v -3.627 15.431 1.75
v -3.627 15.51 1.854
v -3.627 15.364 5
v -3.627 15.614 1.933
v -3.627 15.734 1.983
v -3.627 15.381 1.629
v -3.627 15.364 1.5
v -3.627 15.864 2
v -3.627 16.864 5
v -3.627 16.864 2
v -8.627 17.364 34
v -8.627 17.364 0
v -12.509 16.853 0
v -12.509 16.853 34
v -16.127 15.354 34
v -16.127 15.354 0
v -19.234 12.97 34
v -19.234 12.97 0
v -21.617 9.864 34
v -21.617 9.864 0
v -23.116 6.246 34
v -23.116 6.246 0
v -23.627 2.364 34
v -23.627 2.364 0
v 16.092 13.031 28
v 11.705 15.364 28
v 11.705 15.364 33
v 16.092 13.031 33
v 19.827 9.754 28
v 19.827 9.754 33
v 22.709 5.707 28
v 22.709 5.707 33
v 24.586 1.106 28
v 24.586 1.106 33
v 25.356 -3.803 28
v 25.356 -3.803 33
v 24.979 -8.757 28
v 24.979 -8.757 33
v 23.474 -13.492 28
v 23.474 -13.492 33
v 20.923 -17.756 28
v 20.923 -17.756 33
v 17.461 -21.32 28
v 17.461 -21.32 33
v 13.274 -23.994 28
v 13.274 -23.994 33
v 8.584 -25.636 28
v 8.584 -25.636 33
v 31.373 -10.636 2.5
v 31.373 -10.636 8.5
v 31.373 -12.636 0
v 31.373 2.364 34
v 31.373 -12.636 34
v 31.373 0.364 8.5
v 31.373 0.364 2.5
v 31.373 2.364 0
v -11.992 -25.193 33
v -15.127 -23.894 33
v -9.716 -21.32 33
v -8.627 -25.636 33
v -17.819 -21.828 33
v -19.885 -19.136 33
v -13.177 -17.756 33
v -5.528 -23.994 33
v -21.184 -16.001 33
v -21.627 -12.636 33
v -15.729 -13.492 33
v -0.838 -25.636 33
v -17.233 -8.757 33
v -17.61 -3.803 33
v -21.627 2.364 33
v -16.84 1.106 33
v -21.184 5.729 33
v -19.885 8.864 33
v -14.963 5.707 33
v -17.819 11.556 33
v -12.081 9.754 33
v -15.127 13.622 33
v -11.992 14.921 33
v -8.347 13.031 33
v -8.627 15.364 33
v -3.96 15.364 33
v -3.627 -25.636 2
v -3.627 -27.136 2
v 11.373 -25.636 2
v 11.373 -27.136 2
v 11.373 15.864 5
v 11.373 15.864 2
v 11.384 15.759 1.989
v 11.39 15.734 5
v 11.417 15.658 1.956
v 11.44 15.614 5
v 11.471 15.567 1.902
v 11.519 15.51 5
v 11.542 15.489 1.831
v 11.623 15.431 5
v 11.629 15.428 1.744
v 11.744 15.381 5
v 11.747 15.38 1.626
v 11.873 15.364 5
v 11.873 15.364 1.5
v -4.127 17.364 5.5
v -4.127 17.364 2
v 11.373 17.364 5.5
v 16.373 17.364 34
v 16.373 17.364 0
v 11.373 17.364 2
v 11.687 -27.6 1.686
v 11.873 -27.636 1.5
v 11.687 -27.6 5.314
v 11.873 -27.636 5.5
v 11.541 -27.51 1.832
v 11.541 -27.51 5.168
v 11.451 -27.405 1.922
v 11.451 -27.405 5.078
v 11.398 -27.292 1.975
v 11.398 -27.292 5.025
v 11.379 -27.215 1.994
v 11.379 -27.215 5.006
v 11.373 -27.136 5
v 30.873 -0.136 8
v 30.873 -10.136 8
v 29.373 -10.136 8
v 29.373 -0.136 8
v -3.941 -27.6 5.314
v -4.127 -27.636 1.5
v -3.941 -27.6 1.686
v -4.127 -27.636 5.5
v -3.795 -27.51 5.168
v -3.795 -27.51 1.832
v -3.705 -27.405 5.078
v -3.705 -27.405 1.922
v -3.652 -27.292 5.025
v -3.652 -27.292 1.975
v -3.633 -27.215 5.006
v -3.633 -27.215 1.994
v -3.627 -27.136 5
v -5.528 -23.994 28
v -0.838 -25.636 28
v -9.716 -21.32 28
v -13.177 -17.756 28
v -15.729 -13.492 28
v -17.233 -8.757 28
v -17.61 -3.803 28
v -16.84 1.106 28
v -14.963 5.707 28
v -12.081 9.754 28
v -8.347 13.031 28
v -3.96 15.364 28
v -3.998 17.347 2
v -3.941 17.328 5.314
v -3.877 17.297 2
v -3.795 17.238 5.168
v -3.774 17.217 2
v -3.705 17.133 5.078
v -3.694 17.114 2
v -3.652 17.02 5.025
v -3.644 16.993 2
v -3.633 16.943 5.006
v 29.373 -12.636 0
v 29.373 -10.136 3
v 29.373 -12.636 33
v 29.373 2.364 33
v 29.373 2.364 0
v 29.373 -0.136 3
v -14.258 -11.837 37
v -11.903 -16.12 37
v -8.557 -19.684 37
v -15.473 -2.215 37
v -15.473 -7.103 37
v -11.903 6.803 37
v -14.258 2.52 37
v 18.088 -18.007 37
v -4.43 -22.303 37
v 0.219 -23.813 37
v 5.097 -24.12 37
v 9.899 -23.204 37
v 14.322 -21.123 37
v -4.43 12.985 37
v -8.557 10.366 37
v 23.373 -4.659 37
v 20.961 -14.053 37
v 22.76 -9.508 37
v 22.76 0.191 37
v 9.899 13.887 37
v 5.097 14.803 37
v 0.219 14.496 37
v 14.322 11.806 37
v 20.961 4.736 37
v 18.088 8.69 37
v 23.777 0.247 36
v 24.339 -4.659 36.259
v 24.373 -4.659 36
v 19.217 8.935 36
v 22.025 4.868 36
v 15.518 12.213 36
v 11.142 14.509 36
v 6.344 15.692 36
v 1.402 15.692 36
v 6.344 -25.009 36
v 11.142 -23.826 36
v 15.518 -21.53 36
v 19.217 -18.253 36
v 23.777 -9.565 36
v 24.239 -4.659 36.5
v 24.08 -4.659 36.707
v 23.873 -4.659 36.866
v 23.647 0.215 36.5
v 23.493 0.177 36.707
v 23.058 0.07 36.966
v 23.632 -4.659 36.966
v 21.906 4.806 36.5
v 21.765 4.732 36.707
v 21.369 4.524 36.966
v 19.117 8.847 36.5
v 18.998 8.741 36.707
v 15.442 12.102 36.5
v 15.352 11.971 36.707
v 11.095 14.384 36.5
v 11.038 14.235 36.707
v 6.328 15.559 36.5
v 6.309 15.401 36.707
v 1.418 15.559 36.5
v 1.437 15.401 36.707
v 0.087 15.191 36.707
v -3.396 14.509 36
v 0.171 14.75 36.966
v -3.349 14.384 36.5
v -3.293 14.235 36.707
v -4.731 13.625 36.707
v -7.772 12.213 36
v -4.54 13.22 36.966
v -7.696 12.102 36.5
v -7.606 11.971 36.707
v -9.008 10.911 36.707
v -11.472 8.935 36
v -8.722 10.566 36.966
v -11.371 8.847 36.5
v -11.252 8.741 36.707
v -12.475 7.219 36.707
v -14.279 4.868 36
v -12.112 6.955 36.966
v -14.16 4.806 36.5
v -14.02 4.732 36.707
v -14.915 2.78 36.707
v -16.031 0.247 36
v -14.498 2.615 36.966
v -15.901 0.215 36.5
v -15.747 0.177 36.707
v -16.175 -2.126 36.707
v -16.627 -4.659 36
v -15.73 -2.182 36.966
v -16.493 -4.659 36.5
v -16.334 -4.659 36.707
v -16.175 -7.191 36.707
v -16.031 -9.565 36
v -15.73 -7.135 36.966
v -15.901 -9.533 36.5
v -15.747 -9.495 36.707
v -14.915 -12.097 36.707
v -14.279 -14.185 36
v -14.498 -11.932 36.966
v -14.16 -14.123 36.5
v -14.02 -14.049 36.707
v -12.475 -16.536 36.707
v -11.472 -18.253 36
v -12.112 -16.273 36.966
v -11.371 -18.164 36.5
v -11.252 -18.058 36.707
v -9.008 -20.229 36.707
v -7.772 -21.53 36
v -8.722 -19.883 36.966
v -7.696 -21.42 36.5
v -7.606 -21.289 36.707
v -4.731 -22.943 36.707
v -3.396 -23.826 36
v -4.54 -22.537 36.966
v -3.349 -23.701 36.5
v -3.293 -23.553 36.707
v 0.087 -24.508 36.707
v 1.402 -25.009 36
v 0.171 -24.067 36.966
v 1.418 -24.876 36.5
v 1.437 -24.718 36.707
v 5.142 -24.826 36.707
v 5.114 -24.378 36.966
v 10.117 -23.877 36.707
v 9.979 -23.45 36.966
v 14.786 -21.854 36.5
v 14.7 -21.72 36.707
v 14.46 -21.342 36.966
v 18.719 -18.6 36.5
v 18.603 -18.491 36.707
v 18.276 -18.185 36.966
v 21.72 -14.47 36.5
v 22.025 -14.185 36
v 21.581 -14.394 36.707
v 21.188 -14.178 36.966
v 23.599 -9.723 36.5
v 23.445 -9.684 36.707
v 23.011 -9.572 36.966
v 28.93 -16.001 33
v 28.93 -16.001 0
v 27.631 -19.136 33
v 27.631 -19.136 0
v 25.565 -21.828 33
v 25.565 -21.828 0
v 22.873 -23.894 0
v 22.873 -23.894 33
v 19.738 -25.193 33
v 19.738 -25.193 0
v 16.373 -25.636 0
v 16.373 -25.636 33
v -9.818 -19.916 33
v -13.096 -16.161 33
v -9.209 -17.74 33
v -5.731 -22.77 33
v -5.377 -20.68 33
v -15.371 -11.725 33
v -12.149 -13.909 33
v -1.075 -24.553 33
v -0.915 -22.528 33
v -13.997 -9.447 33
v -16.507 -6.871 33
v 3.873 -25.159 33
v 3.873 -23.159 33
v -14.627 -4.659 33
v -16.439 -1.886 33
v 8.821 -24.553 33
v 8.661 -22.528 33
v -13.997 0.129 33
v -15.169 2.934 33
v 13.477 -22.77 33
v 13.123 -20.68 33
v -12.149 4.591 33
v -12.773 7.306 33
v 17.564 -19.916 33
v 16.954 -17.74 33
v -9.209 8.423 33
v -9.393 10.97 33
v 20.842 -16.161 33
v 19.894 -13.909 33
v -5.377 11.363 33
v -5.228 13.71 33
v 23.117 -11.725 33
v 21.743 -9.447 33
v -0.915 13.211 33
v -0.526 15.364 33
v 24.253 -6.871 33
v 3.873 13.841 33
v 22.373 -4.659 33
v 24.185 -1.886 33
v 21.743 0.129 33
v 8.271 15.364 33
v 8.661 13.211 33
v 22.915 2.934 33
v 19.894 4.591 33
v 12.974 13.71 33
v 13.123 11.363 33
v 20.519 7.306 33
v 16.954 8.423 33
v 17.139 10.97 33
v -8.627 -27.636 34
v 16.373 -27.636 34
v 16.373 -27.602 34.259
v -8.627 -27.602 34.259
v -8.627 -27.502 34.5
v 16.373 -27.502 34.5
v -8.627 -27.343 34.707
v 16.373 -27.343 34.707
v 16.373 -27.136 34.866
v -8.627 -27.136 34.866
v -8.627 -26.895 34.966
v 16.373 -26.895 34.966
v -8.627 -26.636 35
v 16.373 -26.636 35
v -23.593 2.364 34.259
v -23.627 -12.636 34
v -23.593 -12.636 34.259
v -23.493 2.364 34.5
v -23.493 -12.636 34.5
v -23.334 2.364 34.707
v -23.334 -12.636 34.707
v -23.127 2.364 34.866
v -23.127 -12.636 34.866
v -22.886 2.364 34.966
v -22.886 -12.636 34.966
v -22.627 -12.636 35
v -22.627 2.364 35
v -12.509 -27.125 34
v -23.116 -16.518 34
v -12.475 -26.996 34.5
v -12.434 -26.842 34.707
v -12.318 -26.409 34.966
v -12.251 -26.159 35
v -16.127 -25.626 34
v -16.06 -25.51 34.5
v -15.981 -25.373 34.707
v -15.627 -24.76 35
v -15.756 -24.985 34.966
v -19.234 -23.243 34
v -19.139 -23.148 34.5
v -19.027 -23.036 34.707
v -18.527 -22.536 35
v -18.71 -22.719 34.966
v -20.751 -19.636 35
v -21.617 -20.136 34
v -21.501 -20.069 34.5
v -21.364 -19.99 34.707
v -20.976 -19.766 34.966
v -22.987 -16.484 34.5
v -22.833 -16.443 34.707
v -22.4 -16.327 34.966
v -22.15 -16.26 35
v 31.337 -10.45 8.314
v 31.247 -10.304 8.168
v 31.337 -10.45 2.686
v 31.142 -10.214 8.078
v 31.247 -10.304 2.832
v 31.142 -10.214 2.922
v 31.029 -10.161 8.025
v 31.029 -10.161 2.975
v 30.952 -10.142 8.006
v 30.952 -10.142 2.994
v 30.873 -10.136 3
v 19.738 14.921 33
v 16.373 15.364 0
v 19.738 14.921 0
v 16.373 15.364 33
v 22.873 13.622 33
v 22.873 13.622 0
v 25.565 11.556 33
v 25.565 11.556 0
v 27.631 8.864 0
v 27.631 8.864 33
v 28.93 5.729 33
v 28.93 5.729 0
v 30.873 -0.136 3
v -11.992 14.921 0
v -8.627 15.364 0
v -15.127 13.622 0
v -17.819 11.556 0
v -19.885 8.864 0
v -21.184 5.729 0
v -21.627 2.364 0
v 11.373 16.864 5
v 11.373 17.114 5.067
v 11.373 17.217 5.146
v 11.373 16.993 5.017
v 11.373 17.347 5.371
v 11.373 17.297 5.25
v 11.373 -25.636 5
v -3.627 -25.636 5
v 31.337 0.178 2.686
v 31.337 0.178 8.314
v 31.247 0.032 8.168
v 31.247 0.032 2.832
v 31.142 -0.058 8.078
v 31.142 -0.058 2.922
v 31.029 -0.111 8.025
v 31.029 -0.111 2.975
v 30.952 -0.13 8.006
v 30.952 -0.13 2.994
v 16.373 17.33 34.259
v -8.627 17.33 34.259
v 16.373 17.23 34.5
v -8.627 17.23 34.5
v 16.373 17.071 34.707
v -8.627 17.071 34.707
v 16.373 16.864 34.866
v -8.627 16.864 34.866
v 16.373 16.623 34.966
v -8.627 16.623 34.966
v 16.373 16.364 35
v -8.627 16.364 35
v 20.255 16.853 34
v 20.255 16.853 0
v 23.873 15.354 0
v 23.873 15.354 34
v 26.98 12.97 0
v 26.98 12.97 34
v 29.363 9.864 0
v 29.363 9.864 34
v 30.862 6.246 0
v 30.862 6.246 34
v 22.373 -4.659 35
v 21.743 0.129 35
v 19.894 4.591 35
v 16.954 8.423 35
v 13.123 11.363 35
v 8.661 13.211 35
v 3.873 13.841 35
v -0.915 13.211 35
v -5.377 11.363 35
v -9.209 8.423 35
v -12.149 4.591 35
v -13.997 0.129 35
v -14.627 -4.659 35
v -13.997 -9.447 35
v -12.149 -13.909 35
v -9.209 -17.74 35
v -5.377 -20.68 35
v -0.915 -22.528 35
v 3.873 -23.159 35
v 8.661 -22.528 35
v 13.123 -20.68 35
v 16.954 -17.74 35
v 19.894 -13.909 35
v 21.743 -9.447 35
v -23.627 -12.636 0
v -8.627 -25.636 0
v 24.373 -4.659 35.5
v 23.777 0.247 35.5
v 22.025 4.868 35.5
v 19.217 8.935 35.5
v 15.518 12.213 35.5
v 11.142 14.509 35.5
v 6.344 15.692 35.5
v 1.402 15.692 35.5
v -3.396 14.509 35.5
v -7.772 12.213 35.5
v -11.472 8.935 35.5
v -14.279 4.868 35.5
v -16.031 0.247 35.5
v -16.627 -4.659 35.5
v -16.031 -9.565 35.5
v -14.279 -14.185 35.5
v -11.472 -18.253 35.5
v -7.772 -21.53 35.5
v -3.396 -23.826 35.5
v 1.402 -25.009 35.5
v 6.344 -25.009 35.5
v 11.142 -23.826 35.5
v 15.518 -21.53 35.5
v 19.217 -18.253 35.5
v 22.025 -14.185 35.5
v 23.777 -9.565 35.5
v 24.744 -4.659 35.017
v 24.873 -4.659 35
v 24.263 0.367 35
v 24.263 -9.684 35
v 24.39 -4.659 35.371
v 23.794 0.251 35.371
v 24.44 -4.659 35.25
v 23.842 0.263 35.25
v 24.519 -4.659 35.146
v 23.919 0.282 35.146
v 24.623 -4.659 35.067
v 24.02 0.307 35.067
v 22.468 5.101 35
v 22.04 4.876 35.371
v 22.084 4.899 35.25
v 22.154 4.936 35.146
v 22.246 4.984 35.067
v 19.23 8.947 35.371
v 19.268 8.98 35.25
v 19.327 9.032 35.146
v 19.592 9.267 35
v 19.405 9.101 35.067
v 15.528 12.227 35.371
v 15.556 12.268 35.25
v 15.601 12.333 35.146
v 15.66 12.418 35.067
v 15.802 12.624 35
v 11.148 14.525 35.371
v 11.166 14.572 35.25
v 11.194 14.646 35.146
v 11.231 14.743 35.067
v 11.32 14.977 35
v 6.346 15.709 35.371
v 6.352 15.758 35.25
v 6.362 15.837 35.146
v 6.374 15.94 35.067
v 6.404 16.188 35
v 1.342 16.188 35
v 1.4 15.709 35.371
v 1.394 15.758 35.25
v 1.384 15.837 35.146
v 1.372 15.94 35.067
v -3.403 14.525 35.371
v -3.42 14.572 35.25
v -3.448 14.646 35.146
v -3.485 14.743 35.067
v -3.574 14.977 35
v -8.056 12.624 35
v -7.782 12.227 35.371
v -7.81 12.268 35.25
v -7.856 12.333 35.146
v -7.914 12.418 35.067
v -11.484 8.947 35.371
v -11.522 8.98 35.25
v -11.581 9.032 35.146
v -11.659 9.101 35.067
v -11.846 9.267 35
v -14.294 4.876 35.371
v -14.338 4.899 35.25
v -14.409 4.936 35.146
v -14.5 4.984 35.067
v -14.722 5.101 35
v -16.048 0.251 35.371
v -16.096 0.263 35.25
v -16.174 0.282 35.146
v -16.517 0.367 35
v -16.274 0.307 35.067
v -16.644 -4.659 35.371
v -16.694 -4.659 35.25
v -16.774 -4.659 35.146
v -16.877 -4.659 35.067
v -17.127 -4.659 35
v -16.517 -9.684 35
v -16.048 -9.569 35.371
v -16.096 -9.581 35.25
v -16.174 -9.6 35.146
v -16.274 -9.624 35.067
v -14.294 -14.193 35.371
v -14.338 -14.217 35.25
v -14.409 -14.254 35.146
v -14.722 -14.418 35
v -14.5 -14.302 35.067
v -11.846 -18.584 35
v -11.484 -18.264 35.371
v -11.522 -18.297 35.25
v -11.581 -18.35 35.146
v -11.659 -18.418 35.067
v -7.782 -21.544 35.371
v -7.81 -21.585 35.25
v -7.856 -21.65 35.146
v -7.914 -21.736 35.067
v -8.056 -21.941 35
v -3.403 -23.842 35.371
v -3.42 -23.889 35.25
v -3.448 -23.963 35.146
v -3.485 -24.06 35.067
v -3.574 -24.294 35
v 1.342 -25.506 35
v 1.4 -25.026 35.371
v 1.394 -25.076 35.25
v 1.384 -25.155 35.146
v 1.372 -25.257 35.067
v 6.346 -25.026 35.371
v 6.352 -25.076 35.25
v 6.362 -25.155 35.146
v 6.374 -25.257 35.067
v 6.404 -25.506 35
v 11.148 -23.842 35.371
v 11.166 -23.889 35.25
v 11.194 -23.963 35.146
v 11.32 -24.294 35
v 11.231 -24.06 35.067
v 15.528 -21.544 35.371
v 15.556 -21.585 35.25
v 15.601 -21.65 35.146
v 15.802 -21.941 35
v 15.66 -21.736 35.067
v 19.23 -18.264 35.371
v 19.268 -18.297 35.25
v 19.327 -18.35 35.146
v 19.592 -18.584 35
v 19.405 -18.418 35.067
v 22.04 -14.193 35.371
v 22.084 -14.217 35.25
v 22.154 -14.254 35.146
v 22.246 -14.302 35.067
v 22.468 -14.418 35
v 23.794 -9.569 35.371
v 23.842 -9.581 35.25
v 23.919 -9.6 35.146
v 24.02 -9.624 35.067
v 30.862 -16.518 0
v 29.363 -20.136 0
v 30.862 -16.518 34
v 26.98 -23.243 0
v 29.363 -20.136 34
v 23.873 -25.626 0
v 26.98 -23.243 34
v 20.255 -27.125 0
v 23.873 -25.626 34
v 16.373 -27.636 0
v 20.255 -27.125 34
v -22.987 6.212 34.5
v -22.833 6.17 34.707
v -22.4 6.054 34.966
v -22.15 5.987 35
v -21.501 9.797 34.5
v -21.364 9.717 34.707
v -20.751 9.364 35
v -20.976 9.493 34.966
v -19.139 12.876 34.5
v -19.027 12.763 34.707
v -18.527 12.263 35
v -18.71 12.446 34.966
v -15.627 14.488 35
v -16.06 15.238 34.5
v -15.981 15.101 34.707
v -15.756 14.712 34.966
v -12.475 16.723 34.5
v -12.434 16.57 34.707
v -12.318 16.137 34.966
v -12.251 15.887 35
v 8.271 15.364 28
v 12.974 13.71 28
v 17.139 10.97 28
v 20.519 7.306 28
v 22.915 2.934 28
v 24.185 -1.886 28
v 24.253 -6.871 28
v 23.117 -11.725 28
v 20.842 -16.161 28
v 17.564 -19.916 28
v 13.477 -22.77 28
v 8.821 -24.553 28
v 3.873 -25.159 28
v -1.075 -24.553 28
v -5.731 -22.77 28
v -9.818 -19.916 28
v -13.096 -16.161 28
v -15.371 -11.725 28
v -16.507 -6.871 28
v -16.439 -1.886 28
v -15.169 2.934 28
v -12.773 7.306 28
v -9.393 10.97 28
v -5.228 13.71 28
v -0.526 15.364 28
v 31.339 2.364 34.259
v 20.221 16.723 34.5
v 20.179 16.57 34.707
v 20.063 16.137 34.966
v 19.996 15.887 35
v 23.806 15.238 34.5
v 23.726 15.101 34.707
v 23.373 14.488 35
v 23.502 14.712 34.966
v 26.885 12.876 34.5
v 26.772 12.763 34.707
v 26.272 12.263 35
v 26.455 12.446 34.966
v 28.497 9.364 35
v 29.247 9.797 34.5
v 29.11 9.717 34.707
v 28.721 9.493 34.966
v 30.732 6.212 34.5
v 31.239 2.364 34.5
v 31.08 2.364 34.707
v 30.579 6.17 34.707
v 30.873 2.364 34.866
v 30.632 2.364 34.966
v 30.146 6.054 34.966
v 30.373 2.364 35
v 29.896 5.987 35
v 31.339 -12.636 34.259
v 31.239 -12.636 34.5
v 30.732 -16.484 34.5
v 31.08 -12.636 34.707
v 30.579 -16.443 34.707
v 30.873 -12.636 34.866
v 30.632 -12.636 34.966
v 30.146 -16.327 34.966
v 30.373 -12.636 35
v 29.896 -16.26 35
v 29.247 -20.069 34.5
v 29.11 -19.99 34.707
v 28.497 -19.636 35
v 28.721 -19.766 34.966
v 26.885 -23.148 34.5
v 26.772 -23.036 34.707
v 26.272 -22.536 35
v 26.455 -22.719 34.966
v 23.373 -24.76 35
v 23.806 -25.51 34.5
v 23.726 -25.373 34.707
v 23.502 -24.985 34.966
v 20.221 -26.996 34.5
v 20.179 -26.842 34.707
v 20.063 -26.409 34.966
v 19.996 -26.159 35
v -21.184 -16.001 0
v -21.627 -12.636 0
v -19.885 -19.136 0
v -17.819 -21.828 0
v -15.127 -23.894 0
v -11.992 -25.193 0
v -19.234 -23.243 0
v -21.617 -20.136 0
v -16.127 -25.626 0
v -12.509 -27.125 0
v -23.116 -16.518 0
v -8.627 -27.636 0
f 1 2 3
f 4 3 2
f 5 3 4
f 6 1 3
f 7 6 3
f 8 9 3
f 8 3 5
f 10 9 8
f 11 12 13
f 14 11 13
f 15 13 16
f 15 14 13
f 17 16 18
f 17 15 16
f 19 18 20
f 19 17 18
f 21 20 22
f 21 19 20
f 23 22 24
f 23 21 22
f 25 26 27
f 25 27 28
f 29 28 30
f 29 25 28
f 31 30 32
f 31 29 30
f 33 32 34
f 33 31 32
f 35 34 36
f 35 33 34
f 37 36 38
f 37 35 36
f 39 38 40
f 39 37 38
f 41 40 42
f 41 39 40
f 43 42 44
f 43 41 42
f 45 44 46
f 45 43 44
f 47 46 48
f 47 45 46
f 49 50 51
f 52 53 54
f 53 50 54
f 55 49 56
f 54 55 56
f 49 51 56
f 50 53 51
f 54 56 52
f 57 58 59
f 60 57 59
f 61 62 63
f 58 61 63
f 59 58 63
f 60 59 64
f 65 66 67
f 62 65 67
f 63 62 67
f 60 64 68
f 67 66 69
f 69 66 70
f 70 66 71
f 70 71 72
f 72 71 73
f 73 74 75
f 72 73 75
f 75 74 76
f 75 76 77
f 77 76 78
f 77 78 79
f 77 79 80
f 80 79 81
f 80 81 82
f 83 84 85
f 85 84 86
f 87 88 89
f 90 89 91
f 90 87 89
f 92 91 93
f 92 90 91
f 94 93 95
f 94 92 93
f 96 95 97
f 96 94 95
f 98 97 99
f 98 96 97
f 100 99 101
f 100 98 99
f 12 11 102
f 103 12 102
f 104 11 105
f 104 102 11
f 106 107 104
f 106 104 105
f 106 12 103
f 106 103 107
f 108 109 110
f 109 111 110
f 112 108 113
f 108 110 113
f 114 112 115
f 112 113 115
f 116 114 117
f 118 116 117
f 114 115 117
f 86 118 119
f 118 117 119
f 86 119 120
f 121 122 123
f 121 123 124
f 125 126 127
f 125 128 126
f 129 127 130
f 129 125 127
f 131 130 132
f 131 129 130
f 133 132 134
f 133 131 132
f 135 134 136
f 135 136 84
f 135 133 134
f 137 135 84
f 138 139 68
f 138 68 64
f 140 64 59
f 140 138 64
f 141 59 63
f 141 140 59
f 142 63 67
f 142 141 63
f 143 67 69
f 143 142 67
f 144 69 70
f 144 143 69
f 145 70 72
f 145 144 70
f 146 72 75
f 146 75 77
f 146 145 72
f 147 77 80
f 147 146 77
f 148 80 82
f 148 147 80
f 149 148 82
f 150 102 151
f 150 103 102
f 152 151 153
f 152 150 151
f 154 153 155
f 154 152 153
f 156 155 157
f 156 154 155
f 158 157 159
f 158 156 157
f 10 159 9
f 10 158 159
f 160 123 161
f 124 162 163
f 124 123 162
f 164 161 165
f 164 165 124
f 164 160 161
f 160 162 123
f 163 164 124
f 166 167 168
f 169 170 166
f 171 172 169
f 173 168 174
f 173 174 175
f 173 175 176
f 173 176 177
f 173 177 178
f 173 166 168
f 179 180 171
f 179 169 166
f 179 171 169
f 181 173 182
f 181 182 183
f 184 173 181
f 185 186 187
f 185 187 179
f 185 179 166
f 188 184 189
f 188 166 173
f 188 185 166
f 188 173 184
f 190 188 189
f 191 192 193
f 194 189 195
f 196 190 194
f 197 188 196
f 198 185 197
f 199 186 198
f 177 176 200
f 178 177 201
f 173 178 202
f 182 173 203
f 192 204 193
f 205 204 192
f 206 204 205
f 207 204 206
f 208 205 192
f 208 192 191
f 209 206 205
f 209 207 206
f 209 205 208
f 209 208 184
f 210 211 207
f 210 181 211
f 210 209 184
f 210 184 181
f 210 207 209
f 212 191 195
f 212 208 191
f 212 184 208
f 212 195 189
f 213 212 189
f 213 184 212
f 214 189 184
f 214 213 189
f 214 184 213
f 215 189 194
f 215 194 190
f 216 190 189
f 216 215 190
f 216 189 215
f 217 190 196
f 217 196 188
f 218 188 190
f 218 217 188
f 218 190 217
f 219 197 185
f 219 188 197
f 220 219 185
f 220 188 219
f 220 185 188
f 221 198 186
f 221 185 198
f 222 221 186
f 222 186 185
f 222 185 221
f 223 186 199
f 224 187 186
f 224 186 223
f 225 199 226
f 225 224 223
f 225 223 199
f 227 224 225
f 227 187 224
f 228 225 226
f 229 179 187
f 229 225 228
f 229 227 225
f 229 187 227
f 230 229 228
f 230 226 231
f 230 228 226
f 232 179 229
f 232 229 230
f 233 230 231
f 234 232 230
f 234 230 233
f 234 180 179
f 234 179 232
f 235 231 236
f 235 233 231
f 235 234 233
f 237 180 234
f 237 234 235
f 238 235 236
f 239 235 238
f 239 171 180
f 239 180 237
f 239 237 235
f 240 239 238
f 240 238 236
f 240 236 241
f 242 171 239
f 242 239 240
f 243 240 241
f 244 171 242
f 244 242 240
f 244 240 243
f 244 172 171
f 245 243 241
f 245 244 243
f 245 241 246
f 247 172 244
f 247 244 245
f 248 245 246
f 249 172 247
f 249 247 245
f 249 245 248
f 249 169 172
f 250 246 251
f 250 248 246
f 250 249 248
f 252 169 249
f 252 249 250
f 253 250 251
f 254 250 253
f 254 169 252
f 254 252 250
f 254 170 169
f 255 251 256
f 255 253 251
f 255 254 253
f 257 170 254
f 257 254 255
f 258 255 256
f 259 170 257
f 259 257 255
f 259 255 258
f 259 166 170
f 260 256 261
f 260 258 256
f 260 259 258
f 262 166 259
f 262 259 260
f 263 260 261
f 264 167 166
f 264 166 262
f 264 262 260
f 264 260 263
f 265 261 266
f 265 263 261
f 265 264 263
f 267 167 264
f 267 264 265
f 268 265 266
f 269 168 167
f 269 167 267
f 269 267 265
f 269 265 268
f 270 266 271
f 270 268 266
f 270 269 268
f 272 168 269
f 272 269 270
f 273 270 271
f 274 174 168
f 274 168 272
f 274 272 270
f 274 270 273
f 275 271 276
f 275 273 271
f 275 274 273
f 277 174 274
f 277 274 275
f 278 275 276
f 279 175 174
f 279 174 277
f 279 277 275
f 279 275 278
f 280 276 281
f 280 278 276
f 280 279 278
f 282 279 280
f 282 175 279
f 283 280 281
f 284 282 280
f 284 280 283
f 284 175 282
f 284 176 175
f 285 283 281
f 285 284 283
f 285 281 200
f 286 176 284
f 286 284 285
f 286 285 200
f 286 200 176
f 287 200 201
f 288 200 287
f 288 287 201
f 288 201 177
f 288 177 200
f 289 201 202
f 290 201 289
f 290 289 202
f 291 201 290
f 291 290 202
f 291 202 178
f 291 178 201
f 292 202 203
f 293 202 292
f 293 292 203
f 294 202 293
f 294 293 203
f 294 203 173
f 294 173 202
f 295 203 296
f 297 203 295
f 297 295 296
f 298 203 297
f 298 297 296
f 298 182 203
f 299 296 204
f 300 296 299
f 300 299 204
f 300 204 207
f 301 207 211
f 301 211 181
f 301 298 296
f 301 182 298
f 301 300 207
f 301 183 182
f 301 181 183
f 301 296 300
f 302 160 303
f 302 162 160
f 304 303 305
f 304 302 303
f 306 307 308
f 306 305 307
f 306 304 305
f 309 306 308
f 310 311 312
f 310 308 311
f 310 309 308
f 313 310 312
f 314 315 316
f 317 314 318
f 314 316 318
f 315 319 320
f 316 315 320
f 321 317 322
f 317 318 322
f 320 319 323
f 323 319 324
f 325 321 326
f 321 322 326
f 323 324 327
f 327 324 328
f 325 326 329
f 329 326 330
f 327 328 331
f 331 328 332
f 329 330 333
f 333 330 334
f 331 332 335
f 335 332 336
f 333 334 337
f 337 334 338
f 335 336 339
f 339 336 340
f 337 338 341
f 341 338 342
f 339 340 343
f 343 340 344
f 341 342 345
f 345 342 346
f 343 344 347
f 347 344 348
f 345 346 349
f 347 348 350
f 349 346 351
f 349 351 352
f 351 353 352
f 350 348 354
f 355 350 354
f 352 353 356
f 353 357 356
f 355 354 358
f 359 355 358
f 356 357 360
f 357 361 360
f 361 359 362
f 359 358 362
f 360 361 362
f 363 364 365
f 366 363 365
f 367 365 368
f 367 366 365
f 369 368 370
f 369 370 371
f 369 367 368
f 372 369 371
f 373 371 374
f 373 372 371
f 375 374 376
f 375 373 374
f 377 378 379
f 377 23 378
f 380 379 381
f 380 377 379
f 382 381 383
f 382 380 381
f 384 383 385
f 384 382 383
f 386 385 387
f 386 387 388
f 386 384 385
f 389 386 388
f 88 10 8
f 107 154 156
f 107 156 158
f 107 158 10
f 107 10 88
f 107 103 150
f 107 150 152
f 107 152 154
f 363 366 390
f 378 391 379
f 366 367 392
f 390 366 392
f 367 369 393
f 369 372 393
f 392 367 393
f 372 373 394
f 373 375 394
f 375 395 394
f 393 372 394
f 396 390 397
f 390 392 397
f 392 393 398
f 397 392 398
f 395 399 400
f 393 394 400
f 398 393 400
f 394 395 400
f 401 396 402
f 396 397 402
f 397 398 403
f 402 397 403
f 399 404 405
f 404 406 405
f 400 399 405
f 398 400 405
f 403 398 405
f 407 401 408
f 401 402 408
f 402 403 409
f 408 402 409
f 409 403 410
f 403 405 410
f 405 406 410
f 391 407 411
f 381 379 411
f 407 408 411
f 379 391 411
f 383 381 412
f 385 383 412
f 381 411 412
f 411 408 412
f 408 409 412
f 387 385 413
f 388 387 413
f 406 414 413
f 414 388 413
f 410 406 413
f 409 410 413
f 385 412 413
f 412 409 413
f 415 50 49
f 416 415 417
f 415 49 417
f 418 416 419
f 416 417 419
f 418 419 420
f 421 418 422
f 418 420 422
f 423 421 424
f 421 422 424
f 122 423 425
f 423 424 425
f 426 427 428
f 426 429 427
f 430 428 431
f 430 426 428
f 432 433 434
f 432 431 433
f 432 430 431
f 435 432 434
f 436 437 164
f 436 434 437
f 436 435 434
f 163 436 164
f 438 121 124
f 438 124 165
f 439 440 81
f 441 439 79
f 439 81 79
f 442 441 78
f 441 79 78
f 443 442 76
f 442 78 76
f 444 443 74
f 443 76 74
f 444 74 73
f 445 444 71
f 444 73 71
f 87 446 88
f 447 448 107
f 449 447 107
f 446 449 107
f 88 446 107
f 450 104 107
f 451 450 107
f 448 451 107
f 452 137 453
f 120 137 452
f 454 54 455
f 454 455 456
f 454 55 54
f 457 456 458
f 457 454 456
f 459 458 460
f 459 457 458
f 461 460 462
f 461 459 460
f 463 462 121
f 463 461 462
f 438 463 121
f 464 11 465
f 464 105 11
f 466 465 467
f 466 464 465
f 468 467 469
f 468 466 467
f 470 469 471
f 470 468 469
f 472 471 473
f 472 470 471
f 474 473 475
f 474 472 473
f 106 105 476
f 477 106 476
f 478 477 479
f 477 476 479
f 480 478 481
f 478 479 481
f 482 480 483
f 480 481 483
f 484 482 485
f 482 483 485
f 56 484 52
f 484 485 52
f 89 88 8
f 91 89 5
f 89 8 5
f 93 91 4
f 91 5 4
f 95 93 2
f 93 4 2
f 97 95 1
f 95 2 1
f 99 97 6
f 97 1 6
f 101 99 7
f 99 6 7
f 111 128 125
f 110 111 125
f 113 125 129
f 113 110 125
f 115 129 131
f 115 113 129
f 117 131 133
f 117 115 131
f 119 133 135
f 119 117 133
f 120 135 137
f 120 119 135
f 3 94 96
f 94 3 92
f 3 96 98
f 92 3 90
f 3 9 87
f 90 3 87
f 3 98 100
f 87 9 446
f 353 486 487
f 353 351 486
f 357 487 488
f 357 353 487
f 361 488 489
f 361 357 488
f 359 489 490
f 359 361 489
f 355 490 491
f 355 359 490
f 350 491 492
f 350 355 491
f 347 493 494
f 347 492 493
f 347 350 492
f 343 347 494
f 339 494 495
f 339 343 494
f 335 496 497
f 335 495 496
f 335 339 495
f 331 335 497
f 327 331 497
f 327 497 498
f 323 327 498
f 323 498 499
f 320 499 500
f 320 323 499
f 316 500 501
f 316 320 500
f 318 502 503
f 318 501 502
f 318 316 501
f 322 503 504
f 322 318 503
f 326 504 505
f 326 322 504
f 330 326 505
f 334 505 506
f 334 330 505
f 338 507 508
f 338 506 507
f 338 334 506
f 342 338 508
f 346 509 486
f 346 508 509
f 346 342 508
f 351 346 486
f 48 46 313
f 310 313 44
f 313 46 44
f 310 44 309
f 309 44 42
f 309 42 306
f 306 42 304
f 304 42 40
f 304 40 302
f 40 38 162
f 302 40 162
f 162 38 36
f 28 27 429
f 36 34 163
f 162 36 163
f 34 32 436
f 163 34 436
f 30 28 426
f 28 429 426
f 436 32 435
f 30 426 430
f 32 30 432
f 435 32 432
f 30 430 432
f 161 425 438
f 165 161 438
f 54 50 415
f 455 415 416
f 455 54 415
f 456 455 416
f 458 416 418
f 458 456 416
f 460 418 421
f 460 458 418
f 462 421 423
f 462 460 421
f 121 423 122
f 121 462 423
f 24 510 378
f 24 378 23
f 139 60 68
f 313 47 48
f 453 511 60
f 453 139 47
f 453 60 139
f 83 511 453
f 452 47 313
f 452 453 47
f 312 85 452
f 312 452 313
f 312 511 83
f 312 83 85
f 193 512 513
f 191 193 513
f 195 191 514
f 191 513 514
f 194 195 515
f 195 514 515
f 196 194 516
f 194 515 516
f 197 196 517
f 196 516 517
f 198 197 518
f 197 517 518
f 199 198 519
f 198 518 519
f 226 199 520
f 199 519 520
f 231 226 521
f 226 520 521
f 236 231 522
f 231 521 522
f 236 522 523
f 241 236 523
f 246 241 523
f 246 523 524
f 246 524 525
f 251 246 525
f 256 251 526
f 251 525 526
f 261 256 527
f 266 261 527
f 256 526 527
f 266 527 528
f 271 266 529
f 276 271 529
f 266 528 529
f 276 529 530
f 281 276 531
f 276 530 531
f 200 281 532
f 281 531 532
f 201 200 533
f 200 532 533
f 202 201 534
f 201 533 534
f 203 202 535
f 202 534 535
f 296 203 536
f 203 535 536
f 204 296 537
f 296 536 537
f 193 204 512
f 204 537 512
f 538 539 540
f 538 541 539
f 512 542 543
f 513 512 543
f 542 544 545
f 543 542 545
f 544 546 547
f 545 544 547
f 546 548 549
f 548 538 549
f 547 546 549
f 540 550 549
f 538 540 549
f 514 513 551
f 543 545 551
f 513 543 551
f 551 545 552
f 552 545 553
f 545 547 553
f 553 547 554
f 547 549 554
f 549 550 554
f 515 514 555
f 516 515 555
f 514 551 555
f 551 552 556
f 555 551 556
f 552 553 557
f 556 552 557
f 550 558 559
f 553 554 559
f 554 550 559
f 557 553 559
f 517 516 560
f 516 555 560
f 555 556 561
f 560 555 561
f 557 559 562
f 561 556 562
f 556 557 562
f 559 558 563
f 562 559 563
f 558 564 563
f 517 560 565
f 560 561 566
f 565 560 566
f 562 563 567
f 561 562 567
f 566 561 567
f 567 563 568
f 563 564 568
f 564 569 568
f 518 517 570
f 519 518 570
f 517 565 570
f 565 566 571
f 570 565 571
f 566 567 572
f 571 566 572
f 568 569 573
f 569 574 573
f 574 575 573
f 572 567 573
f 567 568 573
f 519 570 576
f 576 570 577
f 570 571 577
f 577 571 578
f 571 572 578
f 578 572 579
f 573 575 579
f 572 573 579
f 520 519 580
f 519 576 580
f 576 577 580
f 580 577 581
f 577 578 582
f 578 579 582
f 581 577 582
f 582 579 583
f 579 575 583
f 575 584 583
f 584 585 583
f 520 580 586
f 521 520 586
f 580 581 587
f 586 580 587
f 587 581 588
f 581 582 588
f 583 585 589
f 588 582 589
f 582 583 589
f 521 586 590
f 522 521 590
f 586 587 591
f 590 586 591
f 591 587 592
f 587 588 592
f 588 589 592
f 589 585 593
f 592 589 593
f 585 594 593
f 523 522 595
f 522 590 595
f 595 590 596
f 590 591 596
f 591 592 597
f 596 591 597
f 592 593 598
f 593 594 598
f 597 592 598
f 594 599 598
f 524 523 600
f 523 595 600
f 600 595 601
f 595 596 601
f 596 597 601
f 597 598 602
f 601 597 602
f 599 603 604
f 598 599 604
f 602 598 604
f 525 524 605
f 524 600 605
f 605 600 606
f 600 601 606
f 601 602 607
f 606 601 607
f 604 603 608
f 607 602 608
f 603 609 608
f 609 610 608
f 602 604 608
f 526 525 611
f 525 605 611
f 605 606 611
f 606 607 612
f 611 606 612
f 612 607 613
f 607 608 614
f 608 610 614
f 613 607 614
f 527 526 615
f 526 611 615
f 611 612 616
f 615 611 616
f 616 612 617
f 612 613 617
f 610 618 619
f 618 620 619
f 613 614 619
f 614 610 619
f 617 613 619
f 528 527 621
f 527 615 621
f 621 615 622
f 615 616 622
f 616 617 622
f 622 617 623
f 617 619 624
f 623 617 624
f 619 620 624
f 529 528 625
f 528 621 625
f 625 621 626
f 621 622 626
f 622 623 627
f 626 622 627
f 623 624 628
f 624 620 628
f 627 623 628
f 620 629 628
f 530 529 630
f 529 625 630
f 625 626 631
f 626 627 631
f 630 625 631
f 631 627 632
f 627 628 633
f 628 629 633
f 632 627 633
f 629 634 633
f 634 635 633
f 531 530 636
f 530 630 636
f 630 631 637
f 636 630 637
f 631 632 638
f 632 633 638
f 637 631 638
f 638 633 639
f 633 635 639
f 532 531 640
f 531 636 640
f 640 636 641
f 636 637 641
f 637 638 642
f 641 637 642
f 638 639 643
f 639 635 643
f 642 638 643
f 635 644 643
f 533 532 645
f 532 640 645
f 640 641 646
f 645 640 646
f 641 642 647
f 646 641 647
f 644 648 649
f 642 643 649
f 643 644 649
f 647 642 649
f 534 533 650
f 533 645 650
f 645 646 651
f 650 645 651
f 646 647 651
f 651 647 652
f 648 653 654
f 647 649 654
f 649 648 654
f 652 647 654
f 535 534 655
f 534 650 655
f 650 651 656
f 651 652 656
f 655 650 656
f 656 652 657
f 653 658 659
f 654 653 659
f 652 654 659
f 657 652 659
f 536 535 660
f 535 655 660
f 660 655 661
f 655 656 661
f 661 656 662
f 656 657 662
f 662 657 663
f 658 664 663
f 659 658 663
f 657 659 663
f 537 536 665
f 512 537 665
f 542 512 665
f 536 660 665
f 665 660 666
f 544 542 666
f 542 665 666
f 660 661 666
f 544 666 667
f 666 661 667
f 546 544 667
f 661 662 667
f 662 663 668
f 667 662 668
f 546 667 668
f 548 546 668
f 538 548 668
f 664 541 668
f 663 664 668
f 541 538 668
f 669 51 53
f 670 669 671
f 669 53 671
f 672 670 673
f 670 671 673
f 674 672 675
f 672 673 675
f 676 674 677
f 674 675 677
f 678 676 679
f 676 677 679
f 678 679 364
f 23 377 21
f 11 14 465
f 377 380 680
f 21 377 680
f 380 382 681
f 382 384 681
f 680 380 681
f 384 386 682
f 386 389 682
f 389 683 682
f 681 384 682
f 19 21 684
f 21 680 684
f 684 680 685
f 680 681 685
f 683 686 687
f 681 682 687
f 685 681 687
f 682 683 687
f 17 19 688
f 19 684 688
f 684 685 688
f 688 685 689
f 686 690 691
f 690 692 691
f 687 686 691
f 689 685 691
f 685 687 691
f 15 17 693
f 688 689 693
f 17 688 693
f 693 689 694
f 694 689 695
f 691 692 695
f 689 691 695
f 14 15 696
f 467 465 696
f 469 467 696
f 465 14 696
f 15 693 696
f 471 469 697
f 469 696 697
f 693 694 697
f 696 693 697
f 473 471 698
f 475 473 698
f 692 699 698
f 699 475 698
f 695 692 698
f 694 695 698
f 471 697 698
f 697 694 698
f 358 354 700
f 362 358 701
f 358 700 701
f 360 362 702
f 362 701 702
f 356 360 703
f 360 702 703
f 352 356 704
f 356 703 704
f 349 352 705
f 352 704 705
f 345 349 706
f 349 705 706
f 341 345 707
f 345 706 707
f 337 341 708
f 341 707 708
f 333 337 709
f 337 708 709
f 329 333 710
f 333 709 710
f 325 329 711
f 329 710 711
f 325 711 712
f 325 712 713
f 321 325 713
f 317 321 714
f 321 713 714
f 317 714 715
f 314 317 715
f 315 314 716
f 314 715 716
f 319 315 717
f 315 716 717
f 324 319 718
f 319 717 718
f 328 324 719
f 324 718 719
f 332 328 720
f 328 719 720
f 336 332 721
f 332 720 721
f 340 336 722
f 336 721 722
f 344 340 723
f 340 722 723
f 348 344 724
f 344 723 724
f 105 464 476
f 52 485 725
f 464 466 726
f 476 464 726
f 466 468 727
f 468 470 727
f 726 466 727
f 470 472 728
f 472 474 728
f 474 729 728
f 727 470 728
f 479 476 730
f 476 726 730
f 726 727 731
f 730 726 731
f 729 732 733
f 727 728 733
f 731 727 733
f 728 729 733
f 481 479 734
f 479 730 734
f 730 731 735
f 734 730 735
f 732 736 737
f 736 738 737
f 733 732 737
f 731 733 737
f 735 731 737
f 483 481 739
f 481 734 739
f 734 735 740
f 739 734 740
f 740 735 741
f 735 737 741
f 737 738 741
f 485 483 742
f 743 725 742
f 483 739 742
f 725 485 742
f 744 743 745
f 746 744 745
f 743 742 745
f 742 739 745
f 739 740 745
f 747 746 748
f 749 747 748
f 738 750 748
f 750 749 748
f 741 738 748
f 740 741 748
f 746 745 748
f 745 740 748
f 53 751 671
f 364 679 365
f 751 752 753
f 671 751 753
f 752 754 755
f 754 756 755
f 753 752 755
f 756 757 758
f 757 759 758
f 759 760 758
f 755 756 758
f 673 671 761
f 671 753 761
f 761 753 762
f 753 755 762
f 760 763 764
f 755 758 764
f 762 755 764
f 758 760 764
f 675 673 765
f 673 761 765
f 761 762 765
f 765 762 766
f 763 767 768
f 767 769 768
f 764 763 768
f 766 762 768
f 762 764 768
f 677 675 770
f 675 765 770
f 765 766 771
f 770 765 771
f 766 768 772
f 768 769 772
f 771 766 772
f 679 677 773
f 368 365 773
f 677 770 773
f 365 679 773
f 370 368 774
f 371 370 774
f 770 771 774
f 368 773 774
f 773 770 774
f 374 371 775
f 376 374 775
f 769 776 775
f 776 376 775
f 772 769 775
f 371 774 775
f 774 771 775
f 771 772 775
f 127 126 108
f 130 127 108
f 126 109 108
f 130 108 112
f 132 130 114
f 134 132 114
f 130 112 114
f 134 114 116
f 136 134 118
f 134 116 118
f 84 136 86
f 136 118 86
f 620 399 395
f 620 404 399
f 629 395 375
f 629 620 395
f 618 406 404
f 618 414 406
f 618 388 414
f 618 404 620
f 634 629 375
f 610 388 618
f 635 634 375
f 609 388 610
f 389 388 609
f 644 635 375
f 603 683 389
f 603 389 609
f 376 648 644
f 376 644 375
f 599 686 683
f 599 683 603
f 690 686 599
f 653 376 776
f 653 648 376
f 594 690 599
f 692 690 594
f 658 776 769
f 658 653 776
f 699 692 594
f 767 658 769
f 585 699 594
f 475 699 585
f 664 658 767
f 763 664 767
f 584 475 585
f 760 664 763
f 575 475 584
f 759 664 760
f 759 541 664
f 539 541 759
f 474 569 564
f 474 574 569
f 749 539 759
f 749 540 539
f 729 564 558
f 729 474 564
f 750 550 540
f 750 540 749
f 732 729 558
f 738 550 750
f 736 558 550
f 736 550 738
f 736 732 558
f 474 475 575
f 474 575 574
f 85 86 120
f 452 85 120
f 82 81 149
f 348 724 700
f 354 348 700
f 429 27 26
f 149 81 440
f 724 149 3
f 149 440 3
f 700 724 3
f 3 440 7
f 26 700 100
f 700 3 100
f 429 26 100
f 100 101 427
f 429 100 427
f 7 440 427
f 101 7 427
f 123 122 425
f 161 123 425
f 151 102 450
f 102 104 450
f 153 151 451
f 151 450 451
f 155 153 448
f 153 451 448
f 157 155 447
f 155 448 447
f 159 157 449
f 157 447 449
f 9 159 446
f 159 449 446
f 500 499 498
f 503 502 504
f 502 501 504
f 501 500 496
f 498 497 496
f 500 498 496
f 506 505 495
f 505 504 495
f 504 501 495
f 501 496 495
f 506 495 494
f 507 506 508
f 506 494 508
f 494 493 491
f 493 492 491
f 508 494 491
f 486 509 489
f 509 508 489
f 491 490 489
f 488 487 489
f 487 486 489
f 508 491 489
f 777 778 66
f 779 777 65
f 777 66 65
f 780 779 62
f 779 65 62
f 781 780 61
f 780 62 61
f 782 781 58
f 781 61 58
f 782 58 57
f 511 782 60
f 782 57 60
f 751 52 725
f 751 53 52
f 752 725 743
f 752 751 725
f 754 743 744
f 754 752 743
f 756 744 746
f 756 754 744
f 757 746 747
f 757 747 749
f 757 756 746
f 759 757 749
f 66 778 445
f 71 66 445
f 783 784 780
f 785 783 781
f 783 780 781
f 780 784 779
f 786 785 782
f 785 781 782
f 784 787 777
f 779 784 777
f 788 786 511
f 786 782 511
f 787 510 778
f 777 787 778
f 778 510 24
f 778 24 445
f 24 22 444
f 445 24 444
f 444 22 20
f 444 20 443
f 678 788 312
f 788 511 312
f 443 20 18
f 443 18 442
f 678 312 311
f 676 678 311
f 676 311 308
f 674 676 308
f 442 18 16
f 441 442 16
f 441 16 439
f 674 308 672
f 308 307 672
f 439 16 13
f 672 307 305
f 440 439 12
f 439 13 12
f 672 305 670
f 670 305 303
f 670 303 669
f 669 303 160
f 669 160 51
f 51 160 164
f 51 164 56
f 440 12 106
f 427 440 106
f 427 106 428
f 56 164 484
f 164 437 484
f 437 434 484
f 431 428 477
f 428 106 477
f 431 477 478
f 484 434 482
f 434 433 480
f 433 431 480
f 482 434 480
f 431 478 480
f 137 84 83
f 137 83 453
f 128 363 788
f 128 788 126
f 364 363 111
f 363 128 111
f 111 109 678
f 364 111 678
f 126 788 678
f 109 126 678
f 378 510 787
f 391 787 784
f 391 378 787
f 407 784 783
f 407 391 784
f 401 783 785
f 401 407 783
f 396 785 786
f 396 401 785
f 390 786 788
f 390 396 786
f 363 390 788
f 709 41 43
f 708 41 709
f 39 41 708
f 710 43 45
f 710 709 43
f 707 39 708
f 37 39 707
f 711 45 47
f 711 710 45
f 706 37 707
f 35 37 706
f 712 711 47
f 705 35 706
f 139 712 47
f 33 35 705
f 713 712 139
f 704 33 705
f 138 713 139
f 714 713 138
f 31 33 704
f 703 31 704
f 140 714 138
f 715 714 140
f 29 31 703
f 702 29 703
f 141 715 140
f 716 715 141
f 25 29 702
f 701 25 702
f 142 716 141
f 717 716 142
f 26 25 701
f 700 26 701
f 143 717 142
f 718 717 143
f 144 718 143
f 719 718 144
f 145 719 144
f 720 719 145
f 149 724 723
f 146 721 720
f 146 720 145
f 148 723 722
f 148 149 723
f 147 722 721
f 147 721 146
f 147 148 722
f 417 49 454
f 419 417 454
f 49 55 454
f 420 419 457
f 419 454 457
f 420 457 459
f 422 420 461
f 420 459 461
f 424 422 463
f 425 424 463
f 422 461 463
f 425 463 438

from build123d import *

# Parameters (mm, degrees)
SKETCH_1_W          = 55
SKETCH_1_H          = 45
EXTRUDE_1_DEPTH     = 35
SKETCH_4_R          = 20.5
EXTRUDE_3_DEPTH     = 2
FILLET_2_R          = 15
FILLET_3_R          = 15
FILLET_4_R          = 1
SHELL_1_T           = -2
EXTRUDE_START       = 5
SKETCH_7_R          = 21.5
SKETCH_7_R_2        = 20.5
EXTRUDE_4_DEPTH     = 5
FILLET_5_R          = 1
FILLET_6_R          = 0.5
CUT_EXTRUDE_1_REACH = 73.818
SKETCH_8_W          = 5
SKETCH_8_H          = 10
CUT_EXTRUDE_2_REACH = 68.168
SKETCH_14_W         = 15
SKETCH_14_H         = 3
CUT_EXTRUDE_3_REACH = 68.168
SKETCH_17_W         = 15
SKETCH_17_H         = 3
FILLET_9_R          = 0.5


with BuildPart() as part:
    # 스케치1 → 보스-돌출1 (new body)
    with BuildSketch(Plane.XY):
        with Locations((3.872936318, -5.136103152)):
            Rectangle(SKETCH_1_W, SKETCH_1_H)
    extrude(amount=EXTRUDE_1_DEPTH)

    # 스케치4 → 보스-돌출3 (add)
    with BuildSketch(Plane(origin=(-2.164184789, -3.486971785, 35), x_dir=(1, 0, 0), z_dir=(0, 0, 1))):
        with Locations((6.037121107, -1.171687144)):
            Circle(SKETCH_4_R)
    extrude(amount=EXTRUDE_3_DEPTH)

    # 필렛2
    fillet_2_edges = [part.edges().sort_by_distance(p)[0] for p in [
        (31.372936318, 17.363896848, 17.5),
    ]]
    fillet(fillet_2_edges, radius=FILLET_2_R)

    # 필렛3
    fillet_3_edges = [part.edges().sort_by_distance(p)[0] for p in [
        (-23.627063682, 17.363896848, 17.5),
        (31.372936318, -27.636103152, 17.5),
        (-23.627063682, -27.636103152, 17.5),
    ]]
    fillet(fillet_3_edges, radius=FILLET_3_R)

    # 필렛4
    fillet_4_edges = [part.edges().sort_by_distance(p)[0] for p in [
        (3.872936318, 17.363896848, 35),
        (26.979538036, 12.970498566, 35),
        (3.872936318, -27.636103152, 35),
        (-23.627063682, -5.136103152, 35),
        (31.372936318, -5.136103152, 35),
        (-19.2336654, 12.970498566, 35),
        (26.979538036, -23.24270487, 35),
        (-19.2336654, -23.24270487, 35),
    ]]
    fillet(fillet_4_edges, radius=FILLET_4_R)

    # 쉘1
    shell_1_openings = [part.faces().sort_by_distance(p)[0] for p in [
        (3.872936318, -5.136103152, 0),
    ]]
    offset(amount=SHELL_1_T, openings=shell_1_openings, kind=Kind.INTERSECTION)

    # 스케치7 → 보스-돌출4 (add)
    with BuildSketch(Plane(origin=(0, 0, 33), x_dir=(-1, 0, 0), z_dir=(0, 0, -1)).offset(EXTRUDE_START)):
        with Locations((-3.872936318, -4.658658928)):
            Circle(SKETCH_7_R)
        with Locations(Location((-3.872936318, -4.658658928, 0), (0, 0, 180))):
            Circle(SKETCH_7_R_2, mode=Mode.SUBTRACT)
    extrude(amount=-EXTRUDE_4_DEPTH)

    # 필렛5
    fillet_5_edges = [part.edges().sort_by_distance(p)[0] for p in [
        (-16.627063682, -4.658658928, 37),
    ]]
    fillet(fillet_5_edges, radius=FILLET_5_R)

    # 필렛6
    fillet_6_edges = [part.edges().sort_by_distance(p)[0] for p in [
        (-16.627063682, -4.658658928, 35),
    ]]
    fillet(fillet_6_edges, radius=FILLET_6_R)

    # 스케치8 → 컷-돌출1 (cut, up to next)
    with BuildSketch(Plane(origin=(31.372936318, 0, 0), x_dir=(0, 0, -1), z_dir=(1, 0, 0)), mode=Mode.PRIVATE) as cut_extrude_1_sk1:
        with Locations((-5.5, -5.136103152)):
            Rectangle(SKETCH_8_W, SKETCH_8_H)
    cut_extrude_1_tool1 = extrude(cut_extrude_1_sk1.sketch, amount=-CUT_EXTRUDE_1_REACH, mode=Mode.PRIVATE) & part.part
    add(cut_extrude_1_tool1.solids().sort_by_distance((31.372936, -5.136103, 5.5))[0], mode=Mode.SUBTRACT)

    # 스케치14 → 컷-돌출2 (cut, up to next)
    with BuildSketch(Plane(origin=(0, 17.363896848, 0), x_dir=(1, 0, 0), z_dir=(0, 1, 0)), mode=Mode.PRIVATE) as cut_extrude_2_sk1:
        with Locations((3.872936318, -3.5)):
            Rectangle(SKETCH_14_W, SKETCH_14_H)
    cut_extrude_2_tool1 = extrude(cut_extrude_2_sk1.sketch, amount=-CUT_EXTRUDE_2_REACH, mode=Mode.PRIVATE) & part.part
    add(cut_extrude_2_tool1.solids().sort_by_distance((3.872936, 17.363897, 3.5))[0], mode=Mode.SUBTRACT)

    # 스케치17 → 컷-돌출3 (cut, up to next)
    with BuildSketch(Plane.XZ.offset(27.636103152), mode=Mode.PRIVATE) as cut_extrude_3_sk1:
        with Locations((3.872936318, 3.5)):
            Rectangle(SKETCH_17_W, SKETCH_17_H)
    cut_extrude_3_tool1 = extrude(cut_extrude_3_sk1.sketch, amount=-CUT_EXTRUDE_3_REACH, mode=Mode.PRIVATE) & part.part
    add(cut_extrude_3_tool1.solids().sort_by_distance((3.872936, -27.636103, 3.5))[0], mode=Mode.SUBTRACT)

    # 필렛9
    fillet_9_edges = [part.edges().sort_by_distance(p)[0] for p in [
        (31.372936318, -5.136103152, 3),
        (31.372936318, -0.136103152, 5.5),
        (31.372936318, -5.136103152, 8),
        (31.372936318, -10.136103152, 5.5),
        (11.372936318, 15.363896848, 3.5),
        (3.872936318, 15.363896848, 2),
        (-3.627063682, 17.363896848, 3.5),
        (3.872936318, 17.363896848, 5),
        (3.872936318, -27.636103152, 5),
        (11.372936318, -27.636103152, 3.5),
        (3.872936318, -27.636103152, 2),
        (-3.627063682, -27.636103152, 3.5),
    ]]
    fillet(fillet_9_edges, radius=FILLET_9_R)


solid = part.part
